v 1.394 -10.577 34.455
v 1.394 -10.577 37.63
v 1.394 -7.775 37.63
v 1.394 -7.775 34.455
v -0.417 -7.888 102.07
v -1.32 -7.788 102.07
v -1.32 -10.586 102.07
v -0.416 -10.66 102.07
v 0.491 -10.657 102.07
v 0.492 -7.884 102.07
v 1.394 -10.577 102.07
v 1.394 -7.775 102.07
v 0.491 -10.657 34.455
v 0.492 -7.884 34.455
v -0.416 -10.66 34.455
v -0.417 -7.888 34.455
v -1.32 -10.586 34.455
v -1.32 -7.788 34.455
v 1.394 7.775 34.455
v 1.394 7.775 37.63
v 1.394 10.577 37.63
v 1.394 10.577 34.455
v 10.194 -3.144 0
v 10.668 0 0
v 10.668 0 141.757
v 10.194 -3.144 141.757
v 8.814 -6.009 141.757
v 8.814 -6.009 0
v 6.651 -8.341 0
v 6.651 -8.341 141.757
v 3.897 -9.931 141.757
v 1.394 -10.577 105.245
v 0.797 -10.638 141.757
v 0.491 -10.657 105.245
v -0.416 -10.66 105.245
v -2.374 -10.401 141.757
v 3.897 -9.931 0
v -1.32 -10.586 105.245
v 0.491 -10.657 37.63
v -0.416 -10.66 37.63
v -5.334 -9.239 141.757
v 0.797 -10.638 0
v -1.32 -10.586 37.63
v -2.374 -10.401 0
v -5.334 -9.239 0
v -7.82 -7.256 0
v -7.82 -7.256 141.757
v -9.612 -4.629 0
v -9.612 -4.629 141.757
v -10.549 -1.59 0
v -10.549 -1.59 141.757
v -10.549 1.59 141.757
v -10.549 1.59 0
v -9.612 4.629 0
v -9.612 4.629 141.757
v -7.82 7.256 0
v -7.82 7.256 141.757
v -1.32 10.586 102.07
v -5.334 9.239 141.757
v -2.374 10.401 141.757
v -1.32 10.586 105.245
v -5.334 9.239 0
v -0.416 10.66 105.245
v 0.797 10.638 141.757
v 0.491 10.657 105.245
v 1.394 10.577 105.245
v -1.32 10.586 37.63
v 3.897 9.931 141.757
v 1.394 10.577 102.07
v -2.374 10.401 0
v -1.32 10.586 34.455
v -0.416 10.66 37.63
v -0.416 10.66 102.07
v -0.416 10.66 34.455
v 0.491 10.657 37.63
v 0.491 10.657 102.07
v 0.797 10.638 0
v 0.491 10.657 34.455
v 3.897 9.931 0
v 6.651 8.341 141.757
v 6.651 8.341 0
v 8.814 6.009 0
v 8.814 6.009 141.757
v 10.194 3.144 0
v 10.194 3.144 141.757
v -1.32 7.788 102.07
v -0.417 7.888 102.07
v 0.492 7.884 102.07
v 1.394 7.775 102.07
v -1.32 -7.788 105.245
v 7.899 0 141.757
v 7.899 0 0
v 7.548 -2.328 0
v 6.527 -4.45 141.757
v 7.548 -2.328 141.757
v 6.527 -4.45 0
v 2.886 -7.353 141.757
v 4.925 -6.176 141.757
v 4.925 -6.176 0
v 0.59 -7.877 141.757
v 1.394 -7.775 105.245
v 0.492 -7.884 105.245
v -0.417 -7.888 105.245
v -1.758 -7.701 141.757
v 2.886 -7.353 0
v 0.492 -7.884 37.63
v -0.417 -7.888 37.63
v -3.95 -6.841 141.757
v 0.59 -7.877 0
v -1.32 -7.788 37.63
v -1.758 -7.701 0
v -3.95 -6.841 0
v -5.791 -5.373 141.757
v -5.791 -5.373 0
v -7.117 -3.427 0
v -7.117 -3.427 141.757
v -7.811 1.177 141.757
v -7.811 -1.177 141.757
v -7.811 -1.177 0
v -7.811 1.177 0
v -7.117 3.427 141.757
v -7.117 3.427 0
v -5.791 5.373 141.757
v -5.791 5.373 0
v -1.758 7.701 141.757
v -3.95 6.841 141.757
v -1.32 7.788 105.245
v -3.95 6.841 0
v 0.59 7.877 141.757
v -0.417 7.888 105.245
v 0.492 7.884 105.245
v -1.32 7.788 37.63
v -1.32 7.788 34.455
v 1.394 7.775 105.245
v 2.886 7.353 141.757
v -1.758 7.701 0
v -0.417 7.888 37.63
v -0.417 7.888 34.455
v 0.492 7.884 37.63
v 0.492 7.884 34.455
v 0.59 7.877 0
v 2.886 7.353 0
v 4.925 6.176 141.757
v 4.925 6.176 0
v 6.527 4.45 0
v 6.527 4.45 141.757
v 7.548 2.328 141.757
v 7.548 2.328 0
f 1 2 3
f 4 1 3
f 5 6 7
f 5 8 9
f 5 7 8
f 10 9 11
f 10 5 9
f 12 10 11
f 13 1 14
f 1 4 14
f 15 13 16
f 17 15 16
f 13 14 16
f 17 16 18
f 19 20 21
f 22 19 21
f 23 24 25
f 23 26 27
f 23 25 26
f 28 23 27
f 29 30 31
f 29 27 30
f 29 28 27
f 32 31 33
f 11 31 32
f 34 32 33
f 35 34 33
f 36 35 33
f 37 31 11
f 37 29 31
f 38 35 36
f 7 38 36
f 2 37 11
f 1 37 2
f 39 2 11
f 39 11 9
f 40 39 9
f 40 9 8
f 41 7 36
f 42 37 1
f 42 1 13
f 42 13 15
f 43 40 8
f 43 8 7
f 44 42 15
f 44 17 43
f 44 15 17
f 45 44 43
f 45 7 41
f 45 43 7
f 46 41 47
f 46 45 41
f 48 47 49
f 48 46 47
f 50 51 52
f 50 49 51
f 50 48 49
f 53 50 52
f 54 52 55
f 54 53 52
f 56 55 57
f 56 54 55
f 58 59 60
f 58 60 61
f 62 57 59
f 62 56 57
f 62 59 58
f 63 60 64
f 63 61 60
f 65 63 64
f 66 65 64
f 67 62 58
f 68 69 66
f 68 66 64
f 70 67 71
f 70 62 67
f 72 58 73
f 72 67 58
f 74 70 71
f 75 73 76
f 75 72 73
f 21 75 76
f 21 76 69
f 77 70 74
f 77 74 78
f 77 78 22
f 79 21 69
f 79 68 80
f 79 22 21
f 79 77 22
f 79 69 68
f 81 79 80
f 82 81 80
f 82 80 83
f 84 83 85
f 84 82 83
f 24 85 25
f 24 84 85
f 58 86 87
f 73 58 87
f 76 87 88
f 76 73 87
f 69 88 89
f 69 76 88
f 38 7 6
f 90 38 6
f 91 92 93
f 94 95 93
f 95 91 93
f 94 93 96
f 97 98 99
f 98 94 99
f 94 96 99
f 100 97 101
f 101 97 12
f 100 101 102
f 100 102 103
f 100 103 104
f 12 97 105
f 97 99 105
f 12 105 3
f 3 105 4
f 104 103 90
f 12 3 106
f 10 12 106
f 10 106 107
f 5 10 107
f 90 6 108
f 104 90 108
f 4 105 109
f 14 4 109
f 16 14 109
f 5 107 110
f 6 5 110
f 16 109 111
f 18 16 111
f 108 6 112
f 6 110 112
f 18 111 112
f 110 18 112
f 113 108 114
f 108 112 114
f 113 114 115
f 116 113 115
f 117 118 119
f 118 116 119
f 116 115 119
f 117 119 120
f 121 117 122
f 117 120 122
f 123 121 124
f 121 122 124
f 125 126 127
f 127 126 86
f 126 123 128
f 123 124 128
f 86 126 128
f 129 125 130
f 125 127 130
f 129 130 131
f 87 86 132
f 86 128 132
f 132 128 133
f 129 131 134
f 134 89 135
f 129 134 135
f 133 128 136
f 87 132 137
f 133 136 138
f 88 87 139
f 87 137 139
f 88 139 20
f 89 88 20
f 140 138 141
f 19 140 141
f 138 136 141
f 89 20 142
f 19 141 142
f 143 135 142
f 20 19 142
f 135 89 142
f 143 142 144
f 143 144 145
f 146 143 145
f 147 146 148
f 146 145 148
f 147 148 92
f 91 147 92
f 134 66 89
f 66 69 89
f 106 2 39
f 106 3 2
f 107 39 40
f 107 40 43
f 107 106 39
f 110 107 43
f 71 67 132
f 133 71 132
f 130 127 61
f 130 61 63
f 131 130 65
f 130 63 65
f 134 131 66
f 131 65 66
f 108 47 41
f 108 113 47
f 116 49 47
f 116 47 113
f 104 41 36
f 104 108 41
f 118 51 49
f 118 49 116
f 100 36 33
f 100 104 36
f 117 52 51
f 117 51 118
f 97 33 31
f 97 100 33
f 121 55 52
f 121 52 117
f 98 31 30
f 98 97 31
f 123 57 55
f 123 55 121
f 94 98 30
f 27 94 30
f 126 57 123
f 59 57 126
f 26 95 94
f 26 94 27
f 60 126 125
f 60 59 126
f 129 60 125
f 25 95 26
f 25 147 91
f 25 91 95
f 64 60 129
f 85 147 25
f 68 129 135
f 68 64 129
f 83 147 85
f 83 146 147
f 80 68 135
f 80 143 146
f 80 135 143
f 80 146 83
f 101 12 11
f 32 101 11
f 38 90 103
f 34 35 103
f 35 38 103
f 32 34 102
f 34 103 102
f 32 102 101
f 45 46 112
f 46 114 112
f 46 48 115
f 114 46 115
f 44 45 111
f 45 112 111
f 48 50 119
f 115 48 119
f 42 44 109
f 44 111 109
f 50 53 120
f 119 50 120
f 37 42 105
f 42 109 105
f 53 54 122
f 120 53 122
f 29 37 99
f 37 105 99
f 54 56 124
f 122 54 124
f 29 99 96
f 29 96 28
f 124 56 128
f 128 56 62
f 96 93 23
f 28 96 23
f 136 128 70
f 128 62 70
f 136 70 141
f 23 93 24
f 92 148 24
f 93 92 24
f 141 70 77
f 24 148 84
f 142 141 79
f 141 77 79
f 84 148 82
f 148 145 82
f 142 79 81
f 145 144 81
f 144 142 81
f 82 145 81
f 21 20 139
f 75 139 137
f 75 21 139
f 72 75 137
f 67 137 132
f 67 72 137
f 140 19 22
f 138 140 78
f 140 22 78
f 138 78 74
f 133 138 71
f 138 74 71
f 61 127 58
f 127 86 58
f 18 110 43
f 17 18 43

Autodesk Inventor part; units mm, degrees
sketch "Sketch1" plane through (0, 0, 0) normal (0, 0, 1) x (1, 0, 0)
  circle A0 centre (0, 0) radius 7.8994
  circle A1 centre (0, 0) radius 10.668
  dimension "d0" = 15.7988
  dimension "d1" = 21.336
extrude "Extrusion1" add sketch "Sketch1" along normal blind 141.7574
ref_plane "Work Plane1" through (0, 0, 141.7574) normal (0, 0, 1) x (1, 0, 0)
ref_plane "Work Plane2" through (0, 0, 103.6574) normal (0, 0, 1) x (1, 0, 0)
sketch "Sketch2" plane through (0, 0, 103.6574) normal (0, 0, 1) x (1, 0, 0)
  line L0 (-1.32, 11.5038) -> (1.3938, 11.5038)
  line L1 (1.3938, 11.5038) -> (1.3938, -14.9502)
  line L2 (1.3938, -14.9502) -> (-1.32, -14.9502)
  line L3 (-1.32, -14.9502) -> (-1.32, 11.5038)
  point P0 (0, 0)
extrude "Extrusion2" cut sketch "Sketch2" along normal mid plane 3.175
ref_plane "Work Plane3" through (0, 0, 0) normal (0, 0, -1) x (-1, 0, 0)
ref_plane "Work Plane4" through (0, 0, 69.85) normal (0, 0, -1) x (-1, 0, 0)
mirror "Mirror1" about plane through (0, 0, 69.85) normal (0, 0, -1) of "Extrusion2"
properties part number "custom pvc spool"
